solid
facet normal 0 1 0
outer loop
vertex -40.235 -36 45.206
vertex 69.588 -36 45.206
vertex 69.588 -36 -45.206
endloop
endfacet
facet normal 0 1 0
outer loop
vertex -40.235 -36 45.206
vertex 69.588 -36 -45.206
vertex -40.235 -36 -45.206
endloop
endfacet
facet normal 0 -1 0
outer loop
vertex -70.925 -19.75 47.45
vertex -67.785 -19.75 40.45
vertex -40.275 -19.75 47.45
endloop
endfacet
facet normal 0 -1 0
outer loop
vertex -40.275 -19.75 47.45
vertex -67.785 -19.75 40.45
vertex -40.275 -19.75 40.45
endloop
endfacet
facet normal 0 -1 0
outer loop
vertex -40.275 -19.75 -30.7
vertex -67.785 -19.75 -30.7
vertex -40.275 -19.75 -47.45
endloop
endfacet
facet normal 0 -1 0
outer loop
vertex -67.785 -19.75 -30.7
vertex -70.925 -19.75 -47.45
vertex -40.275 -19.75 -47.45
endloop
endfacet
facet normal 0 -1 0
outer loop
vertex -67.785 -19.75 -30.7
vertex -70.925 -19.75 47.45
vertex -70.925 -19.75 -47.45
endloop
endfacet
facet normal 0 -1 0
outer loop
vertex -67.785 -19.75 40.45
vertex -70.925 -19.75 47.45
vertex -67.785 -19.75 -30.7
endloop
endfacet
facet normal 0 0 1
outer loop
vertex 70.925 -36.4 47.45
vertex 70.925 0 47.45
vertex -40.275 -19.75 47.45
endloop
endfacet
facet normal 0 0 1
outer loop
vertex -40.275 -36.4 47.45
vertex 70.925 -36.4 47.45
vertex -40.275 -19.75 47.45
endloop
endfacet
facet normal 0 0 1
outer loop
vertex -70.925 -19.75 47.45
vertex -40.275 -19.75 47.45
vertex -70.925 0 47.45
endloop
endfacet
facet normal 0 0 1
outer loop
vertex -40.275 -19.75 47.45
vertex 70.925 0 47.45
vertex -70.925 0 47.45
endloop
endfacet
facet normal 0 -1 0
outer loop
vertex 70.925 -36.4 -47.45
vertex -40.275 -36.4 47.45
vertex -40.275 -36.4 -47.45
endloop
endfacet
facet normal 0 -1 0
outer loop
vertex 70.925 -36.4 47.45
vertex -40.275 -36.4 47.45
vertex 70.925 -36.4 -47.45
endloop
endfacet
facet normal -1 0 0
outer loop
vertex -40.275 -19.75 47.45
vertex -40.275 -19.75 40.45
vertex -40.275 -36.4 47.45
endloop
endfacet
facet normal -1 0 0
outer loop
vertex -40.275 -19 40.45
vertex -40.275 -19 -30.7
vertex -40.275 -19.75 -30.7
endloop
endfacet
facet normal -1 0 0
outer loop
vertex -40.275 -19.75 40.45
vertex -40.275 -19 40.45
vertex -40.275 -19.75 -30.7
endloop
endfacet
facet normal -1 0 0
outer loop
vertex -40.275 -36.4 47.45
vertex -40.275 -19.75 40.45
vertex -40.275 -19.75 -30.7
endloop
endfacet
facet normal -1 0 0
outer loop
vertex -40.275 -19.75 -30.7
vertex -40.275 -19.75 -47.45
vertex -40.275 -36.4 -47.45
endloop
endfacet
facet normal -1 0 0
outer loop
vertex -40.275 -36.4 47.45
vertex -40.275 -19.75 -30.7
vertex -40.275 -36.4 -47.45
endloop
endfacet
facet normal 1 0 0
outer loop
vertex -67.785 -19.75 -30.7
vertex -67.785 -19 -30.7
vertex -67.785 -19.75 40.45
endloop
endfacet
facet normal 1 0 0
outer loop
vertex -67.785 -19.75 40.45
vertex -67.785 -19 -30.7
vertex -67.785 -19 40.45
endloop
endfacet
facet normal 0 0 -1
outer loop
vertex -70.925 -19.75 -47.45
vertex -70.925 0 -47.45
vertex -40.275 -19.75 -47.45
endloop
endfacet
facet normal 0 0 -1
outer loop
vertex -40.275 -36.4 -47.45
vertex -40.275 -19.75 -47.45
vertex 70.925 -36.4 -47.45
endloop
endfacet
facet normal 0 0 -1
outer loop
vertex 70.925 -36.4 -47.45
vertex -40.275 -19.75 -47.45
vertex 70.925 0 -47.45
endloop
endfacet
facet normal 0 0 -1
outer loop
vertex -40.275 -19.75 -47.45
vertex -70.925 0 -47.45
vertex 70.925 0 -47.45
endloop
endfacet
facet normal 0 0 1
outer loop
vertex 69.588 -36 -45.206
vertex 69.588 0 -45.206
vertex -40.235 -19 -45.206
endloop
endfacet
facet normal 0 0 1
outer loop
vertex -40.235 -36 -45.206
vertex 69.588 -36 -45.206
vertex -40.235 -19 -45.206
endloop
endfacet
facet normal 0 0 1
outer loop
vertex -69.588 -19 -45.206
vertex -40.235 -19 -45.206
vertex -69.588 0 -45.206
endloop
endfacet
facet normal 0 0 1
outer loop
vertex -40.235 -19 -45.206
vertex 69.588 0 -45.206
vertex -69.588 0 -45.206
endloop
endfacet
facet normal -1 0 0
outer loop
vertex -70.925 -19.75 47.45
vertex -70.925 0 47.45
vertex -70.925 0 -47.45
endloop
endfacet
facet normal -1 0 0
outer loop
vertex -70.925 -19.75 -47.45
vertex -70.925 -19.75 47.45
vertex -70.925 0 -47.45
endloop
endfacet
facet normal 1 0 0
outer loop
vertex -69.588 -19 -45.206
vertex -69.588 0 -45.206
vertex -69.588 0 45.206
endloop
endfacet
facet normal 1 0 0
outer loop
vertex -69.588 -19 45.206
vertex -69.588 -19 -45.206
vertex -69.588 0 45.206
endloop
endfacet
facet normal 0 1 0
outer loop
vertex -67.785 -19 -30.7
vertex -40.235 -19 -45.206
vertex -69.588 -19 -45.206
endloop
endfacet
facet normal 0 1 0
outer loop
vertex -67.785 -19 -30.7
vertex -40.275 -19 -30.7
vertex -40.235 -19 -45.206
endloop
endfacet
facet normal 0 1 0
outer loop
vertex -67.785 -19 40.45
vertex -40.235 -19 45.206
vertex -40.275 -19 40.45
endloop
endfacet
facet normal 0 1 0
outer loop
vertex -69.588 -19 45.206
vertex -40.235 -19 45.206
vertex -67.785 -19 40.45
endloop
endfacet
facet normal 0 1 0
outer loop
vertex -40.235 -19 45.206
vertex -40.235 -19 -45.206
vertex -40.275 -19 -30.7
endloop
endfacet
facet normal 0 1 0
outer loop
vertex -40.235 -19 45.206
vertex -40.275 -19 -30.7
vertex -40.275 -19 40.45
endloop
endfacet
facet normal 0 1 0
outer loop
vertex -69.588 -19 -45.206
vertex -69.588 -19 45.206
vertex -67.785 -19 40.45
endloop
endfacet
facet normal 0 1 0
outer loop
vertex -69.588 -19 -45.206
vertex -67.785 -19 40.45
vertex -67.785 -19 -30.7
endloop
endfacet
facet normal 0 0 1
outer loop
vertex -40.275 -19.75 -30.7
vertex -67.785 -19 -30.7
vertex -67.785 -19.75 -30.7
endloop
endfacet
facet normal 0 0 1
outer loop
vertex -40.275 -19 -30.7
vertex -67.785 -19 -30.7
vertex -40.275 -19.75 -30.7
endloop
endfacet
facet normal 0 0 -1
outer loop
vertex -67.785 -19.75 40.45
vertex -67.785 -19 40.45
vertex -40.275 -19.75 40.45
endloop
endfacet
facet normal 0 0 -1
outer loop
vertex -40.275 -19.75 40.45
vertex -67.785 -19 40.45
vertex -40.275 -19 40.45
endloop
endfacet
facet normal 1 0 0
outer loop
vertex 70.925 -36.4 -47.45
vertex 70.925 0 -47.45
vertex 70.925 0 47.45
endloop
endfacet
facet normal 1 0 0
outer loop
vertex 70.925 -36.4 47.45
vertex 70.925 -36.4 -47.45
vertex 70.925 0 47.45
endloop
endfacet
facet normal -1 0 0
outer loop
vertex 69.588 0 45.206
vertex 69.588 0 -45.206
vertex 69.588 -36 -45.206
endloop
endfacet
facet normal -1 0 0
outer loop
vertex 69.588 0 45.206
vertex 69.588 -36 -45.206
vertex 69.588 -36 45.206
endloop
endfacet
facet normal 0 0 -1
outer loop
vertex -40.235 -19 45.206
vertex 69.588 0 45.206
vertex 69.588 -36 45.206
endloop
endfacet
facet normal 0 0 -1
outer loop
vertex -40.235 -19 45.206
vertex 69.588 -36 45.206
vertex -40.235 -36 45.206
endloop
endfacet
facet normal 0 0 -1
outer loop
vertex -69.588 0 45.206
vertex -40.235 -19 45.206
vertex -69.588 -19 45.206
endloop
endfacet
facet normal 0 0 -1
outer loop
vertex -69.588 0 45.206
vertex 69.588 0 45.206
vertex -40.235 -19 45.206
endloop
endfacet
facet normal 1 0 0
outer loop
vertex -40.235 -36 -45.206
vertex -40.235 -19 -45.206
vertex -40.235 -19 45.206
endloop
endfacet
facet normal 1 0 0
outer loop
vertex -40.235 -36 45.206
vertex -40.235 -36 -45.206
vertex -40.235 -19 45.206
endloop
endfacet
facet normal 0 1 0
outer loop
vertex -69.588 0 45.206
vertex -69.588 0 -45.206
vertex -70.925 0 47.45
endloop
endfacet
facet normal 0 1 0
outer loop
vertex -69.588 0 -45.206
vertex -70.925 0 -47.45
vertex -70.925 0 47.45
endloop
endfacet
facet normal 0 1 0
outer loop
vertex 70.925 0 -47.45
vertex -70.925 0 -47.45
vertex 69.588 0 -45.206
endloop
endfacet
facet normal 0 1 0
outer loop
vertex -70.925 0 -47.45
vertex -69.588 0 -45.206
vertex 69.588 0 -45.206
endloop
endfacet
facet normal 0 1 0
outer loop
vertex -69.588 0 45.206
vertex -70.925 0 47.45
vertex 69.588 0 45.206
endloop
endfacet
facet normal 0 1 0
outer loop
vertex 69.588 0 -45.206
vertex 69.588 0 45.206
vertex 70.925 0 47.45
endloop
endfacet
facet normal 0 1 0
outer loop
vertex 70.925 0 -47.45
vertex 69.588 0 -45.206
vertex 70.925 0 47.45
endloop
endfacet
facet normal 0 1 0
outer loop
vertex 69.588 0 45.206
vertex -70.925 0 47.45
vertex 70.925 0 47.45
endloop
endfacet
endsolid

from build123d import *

# Parameters (mm, degrees)
F0_W     = 27.51
F0_H     = 16.75
F0_H_2   = 7
F1_DEPTH = 36.4
F3_DEPTH = 94.9
F4_W     = 139.175252
F4_H     = 90.411716
F4_W_2   = 27.51
F4_H_2   = 71.15
F5_DEPTH = 19
F6_W     = 109.82249
F6_H     = 90.411716
F7_DEPTH = 17


with BuildPart() as f1:
    # F0 (on Front) → F1 (new body)
    with BuildSketch(Plane.XZ):
        Polygon((-40.275, -47.45), (70.925, -47.45), (70.925, 47.45), (-40.275, 47.45), (-40.275, 40.45), (-40.275, -30.7), align=None)
        with Locations((-54.03, -39.075)):
            Rectangle(F0_W, F0_H)
        Polygon((-70.925, -47.45), (-67.785, -47.45), (-67.785, -30.7), (-67.785, 40.45), (-67.785, 47.45), (-70.925, 47.45), align=None)
        with Locations((-54.03, 43.95)):
            Rectangle(F0_W, F0_H_2)
    extrude(amount=F1_DEPTH)

    # F2 (on face) → F3 (cut)
    with BuildSketch(Plane(origin=(0, 0, -47.45), x_dir=(1, 0, 0), z_dir=(0, 0, -1))):
        Polygon((-40.275, 36.4), (-65.575, 36.4), (-70.925, 36.4), (-70.925, 19.75), (-40.275, 19.75), align=None)
    extrude(amount=-F3_DEPTH, mode=Mode.SUBTRACT)

    # F4 (on face) → F5 (cut)
    with BuildSketch(Plane(origin=(0, 0, 0), x_dir=(-1, 0, 0), z_dir=(0, 1, 0))):
        Rectangle(F4_W, F4_H)
        with Locations((54.03, 4.875)):
            Rectangle(F4_W_2, F4_H_2, mode=Mode.SUBTRACT)
    extrude(amount=-F5_DEPTH, mode=Mode.SUBTRACT)

    # F6 (on face) → F7 (cut)
    with BuildSketch(Plane(origin=(0, -19, 0), x_dir=(-1, 0, 0), z_dir=(0, 1, 0))):
        with Locations((-14.676381, 0)):
            Rectangle(F6_W, F6_H)
    extrude(amount=-F7_DEPTH, mode=Mode.SUBTRACT)


solid = f1.part
